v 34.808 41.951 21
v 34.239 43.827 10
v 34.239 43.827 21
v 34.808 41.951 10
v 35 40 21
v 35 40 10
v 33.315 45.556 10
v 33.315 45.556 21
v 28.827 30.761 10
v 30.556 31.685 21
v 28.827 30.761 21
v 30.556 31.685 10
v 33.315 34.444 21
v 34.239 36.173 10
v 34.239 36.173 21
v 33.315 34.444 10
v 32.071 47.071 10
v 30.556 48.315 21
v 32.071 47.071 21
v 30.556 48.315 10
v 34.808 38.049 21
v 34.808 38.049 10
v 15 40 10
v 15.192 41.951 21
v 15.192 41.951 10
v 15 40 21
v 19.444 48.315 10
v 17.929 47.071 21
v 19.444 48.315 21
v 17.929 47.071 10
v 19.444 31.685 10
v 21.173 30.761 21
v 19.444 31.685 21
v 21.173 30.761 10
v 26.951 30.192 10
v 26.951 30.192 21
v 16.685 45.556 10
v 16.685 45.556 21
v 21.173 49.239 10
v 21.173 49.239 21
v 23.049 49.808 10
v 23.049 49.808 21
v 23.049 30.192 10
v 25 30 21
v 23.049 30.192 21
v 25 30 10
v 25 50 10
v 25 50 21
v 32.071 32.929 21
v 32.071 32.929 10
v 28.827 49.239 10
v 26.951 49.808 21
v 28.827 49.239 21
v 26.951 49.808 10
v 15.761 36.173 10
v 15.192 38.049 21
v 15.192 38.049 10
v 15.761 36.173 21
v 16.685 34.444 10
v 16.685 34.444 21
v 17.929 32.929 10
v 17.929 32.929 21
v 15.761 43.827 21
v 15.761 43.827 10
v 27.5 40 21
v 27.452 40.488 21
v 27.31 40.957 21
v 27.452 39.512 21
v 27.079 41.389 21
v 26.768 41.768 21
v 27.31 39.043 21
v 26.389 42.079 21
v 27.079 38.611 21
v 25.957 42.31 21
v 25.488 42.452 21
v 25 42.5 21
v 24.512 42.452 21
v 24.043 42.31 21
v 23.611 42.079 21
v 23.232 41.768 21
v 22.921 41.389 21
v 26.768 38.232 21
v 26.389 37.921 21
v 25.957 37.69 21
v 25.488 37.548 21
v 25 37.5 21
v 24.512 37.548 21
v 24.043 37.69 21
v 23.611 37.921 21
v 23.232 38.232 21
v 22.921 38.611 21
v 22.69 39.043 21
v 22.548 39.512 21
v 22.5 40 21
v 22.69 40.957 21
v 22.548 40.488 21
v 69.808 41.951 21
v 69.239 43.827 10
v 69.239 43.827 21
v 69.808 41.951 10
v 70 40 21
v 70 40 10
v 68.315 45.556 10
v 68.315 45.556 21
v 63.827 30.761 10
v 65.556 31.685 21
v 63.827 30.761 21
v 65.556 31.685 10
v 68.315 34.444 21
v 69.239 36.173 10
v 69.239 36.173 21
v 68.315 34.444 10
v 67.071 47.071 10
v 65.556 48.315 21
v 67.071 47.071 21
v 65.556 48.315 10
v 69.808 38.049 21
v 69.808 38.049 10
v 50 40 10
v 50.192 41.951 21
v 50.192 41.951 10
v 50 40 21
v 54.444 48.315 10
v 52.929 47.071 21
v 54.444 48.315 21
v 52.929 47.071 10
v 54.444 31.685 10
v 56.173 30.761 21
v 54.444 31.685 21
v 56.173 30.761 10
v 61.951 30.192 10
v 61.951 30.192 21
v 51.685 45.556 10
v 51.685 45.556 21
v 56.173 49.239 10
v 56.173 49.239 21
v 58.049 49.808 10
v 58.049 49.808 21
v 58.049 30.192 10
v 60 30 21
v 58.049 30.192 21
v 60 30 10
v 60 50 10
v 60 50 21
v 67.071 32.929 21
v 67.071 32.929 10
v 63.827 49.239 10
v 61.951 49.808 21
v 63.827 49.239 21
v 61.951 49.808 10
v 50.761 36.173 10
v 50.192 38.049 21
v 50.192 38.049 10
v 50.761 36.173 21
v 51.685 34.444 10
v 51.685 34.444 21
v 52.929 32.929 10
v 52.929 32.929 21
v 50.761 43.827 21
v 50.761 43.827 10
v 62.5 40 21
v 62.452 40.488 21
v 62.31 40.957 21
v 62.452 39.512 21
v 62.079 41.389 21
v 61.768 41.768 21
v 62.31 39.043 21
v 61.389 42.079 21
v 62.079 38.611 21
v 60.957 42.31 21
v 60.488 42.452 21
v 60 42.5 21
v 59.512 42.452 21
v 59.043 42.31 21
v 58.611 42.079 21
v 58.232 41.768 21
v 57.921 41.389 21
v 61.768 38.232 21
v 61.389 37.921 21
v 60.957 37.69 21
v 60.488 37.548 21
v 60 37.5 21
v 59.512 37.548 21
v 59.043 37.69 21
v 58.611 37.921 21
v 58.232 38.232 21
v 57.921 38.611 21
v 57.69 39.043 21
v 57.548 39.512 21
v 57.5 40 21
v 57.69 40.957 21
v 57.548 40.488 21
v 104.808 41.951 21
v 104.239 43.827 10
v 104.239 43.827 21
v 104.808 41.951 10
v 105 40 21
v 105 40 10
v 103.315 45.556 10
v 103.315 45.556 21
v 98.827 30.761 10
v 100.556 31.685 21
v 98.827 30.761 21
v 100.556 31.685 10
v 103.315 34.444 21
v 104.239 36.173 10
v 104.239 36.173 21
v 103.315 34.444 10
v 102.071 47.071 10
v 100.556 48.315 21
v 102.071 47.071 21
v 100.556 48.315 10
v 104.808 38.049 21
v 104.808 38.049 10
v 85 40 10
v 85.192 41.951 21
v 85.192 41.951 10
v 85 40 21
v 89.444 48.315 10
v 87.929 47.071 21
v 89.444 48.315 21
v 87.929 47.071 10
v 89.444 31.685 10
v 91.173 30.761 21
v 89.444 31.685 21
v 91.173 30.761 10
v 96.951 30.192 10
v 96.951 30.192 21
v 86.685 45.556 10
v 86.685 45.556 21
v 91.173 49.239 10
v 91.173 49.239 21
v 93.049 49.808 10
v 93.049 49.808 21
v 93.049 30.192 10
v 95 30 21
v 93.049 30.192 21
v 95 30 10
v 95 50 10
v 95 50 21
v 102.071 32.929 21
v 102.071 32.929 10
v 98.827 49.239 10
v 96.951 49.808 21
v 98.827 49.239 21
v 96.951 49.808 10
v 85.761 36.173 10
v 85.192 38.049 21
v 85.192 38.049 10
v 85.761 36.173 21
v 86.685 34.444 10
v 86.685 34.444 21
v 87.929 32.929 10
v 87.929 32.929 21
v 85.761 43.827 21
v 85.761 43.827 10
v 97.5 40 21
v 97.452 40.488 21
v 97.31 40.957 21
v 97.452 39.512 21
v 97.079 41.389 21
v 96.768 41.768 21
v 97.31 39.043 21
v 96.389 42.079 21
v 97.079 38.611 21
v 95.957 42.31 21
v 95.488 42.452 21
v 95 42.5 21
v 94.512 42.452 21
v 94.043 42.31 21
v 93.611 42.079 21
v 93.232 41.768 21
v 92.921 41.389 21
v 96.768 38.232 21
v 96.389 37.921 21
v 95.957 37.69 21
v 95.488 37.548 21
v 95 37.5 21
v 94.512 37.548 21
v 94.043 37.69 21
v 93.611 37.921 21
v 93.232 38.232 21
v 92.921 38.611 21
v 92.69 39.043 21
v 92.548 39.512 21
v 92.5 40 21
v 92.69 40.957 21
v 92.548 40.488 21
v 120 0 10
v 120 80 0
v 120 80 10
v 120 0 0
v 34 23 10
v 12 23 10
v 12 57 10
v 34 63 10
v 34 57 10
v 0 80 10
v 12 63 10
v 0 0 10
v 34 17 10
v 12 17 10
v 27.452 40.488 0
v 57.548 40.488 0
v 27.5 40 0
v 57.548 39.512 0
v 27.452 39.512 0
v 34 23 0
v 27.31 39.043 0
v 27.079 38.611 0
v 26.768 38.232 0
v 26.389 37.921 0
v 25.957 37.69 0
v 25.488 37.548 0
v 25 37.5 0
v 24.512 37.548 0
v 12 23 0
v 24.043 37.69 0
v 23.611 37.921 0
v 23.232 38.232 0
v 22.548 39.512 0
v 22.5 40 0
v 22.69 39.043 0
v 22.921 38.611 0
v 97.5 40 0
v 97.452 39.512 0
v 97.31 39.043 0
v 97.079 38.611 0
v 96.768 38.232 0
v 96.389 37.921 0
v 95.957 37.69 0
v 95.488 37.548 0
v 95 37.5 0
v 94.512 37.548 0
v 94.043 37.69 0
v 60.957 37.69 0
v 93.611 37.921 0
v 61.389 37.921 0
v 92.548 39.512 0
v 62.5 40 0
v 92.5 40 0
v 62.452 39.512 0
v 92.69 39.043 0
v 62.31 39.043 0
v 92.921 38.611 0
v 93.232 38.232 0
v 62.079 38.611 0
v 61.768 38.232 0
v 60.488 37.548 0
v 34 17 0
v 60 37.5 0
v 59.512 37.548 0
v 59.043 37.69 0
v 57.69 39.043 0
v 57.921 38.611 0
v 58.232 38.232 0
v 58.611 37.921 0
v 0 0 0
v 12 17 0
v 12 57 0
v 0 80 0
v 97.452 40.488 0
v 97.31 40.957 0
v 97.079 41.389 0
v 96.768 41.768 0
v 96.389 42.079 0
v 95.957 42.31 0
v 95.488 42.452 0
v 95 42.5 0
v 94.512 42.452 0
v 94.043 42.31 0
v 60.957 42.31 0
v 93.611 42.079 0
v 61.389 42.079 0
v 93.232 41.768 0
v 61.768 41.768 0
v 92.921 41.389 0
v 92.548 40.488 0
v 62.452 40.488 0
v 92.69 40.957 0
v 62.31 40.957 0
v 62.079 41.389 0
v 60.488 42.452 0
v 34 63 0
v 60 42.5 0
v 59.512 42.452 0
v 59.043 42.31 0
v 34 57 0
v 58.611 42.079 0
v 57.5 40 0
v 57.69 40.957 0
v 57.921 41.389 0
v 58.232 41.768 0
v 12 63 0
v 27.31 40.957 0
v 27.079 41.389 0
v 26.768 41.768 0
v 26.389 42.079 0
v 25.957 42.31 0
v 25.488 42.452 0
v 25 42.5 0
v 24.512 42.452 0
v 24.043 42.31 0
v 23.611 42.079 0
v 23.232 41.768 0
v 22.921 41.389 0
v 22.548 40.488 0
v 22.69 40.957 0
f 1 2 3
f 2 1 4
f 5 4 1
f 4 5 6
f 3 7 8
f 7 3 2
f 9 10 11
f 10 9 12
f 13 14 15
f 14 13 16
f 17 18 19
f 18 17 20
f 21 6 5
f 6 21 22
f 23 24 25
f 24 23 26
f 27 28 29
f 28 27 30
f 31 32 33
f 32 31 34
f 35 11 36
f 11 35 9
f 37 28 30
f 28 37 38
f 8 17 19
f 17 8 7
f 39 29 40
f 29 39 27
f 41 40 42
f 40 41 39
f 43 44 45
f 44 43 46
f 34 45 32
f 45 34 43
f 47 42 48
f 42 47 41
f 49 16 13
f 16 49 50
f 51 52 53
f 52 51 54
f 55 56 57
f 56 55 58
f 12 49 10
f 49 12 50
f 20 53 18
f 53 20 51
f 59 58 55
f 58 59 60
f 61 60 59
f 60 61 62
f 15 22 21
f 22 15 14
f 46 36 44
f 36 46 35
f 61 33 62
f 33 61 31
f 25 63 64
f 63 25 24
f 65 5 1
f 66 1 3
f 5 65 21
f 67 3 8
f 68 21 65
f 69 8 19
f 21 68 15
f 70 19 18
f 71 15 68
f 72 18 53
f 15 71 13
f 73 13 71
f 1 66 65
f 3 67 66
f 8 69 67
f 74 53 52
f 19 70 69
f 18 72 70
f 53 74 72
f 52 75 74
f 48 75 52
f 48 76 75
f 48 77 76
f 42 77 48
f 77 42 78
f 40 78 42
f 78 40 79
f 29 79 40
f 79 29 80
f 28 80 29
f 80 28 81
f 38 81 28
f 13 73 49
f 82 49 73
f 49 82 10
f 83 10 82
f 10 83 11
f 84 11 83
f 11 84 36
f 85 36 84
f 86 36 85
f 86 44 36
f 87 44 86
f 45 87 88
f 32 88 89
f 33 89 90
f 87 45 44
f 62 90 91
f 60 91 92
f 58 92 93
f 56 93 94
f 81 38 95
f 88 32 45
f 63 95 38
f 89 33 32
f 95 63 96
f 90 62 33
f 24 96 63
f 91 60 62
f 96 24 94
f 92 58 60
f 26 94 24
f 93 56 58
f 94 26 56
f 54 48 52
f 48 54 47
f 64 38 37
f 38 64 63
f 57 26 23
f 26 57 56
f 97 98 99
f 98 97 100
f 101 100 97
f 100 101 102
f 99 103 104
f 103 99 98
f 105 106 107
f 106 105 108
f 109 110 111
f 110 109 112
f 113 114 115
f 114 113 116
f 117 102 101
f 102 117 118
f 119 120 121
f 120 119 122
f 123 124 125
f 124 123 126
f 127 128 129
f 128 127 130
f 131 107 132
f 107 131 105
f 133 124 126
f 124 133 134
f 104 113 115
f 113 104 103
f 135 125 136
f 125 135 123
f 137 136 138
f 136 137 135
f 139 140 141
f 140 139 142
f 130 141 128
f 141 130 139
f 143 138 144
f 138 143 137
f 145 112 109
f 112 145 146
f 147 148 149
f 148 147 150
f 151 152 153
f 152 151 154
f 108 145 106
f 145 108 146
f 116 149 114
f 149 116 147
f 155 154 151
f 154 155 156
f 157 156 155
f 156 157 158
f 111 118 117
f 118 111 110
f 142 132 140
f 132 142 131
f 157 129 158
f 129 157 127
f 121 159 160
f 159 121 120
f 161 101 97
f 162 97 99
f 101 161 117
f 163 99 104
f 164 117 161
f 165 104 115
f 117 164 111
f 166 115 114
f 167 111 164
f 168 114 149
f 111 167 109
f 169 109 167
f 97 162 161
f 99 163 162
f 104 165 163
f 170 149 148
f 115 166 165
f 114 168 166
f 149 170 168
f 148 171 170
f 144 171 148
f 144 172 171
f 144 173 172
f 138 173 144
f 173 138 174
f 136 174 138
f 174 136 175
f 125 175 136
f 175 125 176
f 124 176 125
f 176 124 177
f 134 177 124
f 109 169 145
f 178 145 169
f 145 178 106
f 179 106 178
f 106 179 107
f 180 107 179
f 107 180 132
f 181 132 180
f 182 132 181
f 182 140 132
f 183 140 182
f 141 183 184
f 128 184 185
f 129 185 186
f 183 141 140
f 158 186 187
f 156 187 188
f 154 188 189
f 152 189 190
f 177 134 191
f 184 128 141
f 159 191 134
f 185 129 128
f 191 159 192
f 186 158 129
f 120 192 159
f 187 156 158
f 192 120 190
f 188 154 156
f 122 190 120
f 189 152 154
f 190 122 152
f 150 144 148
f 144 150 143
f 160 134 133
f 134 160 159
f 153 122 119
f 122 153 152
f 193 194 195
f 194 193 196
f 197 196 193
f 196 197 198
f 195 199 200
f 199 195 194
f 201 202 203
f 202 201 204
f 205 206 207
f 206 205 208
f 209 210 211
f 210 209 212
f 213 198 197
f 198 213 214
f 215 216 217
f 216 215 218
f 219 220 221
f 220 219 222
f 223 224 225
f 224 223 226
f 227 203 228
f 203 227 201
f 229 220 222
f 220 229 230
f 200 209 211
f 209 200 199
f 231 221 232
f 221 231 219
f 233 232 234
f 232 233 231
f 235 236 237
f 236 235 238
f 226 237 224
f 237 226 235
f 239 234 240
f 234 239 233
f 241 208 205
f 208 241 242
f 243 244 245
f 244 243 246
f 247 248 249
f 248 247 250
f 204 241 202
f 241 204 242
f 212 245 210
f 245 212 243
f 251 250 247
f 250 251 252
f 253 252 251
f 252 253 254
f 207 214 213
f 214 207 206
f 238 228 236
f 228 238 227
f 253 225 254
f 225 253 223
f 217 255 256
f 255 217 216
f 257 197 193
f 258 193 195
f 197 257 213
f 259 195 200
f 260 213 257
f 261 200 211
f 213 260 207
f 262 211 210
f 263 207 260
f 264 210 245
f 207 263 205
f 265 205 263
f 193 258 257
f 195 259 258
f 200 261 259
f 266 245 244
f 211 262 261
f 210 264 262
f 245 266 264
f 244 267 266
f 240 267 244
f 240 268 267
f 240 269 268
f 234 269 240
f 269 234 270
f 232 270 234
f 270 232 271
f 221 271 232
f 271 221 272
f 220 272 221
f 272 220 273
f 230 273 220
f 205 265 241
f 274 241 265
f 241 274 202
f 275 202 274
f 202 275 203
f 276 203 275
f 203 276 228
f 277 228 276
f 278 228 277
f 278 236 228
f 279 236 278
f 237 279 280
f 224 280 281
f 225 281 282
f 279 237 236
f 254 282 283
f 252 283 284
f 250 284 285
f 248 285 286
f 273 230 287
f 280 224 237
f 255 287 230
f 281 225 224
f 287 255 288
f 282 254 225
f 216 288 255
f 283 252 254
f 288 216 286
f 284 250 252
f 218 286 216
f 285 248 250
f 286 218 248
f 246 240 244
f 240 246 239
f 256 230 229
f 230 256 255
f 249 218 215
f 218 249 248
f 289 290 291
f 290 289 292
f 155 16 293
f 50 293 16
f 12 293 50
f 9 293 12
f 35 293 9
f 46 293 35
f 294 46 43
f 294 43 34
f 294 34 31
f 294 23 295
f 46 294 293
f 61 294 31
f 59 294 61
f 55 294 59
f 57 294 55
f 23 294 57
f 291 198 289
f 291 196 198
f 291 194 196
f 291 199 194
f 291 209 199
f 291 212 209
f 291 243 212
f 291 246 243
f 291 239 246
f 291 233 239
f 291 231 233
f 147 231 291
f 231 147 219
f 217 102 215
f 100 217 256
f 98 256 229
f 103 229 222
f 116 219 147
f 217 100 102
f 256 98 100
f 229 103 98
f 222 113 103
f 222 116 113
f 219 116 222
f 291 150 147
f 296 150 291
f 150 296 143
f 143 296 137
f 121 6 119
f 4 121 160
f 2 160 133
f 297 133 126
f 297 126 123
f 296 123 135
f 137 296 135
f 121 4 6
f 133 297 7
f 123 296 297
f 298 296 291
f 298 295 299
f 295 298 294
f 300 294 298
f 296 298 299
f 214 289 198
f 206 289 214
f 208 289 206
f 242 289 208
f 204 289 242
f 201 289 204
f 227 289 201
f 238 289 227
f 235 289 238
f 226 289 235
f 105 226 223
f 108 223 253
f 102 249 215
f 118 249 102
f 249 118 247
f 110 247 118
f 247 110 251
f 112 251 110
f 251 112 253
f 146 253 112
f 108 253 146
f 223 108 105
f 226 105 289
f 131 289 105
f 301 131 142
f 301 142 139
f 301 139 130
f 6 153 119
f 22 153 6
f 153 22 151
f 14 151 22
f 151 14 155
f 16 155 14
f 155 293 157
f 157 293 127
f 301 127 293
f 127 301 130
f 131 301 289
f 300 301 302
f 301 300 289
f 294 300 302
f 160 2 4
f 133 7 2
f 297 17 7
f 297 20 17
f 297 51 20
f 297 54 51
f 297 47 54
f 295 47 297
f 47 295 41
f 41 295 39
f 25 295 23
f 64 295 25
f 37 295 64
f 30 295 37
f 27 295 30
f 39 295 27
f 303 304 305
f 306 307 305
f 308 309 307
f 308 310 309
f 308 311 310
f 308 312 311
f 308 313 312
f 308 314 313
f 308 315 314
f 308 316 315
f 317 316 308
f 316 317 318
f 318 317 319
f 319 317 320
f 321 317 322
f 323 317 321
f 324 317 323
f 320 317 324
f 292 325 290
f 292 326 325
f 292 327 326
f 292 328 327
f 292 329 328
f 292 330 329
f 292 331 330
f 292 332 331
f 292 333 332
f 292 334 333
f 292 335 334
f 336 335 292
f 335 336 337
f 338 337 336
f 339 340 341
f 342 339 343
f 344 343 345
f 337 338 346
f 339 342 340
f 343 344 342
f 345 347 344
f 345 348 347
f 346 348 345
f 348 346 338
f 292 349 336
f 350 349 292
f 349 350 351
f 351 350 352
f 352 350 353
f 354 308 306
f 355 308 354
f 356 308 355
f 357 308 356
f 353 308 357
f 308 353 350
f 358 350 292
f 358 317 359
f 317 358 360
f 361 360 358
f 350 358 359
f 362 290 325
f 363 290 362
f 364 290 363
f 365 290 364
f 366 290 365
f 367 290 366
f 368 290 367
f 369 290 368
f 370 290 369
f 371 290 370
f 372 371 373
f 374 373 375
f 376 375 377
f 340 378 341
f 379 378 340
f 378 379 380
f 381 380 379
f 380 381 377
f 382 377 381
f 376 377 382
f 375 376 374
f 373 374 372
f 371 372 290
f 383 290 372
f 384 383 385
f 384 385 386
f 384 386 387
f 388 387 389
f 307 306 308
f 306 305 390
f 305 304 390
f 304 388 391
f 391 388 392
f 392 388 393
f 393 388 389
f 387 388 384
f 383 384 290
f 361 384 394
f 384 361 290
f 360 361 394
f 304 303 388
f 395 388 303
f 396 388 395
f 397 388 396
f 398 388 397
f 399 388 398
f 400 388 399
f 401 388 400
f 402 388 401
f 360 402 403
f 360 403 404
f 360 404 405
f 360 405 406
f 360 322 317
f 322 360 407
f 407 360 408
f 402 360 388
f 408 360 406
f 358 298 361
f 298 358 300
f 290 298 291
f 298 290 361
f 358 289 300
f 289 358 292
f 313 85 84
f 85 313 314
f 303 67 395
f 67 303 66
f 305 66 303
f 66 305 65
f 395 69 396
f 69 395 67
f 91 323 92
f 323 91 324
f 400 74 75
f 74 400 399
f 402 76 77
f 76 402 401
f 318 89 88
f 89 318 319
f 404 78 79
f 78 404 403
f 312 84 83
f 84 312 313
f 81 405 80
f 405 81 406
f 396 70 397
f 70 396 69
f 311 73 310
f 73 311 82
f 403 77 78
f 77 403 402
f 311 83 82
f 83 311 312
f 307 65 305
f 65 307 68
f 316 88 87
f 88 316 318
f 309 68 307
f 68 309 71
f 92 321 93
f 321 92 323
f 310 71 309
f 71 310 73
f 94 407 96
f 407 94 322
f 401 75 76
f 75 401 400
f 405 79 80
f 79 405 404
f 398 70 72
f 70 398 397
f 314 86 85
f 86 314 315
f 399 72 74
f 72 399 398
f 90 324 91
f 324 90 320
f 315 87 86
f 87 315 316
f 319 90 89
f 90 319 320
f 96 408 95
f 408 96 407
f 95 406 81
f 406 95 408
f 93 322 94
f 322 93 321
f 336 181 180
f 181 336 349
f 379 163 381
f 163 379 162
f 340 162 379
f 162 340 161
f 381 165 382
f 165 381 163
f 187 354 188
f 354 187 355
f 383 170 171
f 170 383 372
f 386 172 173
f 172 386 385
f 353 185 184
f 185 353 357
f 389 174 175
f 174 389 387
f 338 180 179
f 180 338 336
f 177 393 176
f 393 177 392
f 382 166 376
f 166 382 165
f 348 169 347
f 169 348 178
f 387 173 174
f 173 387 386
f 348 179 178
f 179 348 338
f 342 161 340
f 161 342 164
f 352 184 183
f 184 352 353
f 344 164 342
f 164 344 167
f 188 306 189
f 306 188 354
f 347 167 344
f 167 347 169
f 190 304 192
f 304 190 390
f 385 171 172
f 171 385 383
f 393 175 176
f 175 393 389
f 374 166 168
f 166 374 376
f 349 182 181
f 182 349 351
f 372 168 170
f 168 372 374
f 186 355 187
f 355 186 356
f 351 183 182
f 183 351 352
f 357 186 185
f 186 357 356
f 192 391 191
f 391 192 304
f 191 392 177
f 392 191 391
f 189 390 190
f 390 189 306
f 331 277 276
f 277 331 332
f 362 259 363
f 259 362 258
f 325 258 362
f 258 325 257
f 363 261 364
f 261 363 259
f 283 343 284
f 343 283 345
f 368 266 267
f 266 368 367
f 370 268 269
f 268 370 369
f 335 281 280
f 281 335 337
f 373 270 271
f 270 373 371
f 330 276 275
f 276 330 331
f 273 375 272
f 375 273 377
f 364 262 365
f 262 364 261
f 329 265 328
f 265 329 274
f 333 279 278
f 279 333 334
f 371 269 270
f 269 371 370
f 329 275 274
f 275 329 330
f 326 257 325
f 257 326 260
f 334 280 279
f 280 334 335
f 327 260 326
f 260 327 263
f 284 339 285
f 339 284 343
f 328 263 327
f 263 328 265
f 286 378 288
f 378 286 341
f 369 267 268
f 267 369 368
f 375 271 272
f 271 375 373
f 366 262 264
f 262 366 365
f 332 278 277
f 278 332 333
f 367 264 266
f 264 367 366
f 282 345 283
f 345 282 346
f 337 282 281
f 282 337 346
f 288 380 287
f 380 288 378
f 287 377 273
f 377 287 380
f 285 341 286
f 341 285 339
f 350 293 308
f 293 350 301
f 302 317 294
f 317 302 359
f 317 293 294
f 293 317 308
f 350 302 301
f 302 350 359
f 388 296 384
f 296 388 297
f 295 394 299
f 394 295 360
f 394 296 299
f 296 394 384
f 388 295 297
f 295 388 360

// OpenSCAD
$fn = 32;

// ----------------------------------------------------------------------
// Drill jig: three_boss_slot jig
// ----------------------------------------------------------------------

// --- parameters (mm) ---
plate_l = 120;            // plate length, X
plate_w = 80;             // plate width, Y
plate_t = 10;             // plate thickness
boss_d = 20;              // guide boss diameter
boss_h = 12;              // boss height above the plate
guide_d = 5;              // guide hole diameter
boss_pitch = 35;          // boss pitch
slot_w = 6;               // clamp slot width
slot_l = 22;              // clamp slot length
slot_x = 12;              // slot start X

n_boss = 3;  // guide bosses
boss_x0 = (plate_l - (n_boss - 1) * boss_pitch) / 2;  // first boss X
boss_top = plate_t - 1 + boss_h;  // boss crown height
total_h = boss_top;  // overall height

difference() {
  union() {
  cube([plate_l, plate_w, plate_t]);
  for (i = [0 : n_boss - 1])
    translate([boss_x0 + i * boss_pitch, plate_w / 2, plate_t - 1])
      cylinder(h = boss_h, d = boss_d);
  }
  for (i = [0 : n_boss - 1])
    translate([boss_x0 + i * boss_pitch, plate_w / 2, -1])
      cylinder(h = plate_t + boss_h, d = guide_d);
  for (cy = [plate_w * 0.25, plate_w * 0.75])
    translate([slot_x, cy - slot_w / 2, -1])
      cube([slot_l, slot_w, plate_t + 2]);
}
